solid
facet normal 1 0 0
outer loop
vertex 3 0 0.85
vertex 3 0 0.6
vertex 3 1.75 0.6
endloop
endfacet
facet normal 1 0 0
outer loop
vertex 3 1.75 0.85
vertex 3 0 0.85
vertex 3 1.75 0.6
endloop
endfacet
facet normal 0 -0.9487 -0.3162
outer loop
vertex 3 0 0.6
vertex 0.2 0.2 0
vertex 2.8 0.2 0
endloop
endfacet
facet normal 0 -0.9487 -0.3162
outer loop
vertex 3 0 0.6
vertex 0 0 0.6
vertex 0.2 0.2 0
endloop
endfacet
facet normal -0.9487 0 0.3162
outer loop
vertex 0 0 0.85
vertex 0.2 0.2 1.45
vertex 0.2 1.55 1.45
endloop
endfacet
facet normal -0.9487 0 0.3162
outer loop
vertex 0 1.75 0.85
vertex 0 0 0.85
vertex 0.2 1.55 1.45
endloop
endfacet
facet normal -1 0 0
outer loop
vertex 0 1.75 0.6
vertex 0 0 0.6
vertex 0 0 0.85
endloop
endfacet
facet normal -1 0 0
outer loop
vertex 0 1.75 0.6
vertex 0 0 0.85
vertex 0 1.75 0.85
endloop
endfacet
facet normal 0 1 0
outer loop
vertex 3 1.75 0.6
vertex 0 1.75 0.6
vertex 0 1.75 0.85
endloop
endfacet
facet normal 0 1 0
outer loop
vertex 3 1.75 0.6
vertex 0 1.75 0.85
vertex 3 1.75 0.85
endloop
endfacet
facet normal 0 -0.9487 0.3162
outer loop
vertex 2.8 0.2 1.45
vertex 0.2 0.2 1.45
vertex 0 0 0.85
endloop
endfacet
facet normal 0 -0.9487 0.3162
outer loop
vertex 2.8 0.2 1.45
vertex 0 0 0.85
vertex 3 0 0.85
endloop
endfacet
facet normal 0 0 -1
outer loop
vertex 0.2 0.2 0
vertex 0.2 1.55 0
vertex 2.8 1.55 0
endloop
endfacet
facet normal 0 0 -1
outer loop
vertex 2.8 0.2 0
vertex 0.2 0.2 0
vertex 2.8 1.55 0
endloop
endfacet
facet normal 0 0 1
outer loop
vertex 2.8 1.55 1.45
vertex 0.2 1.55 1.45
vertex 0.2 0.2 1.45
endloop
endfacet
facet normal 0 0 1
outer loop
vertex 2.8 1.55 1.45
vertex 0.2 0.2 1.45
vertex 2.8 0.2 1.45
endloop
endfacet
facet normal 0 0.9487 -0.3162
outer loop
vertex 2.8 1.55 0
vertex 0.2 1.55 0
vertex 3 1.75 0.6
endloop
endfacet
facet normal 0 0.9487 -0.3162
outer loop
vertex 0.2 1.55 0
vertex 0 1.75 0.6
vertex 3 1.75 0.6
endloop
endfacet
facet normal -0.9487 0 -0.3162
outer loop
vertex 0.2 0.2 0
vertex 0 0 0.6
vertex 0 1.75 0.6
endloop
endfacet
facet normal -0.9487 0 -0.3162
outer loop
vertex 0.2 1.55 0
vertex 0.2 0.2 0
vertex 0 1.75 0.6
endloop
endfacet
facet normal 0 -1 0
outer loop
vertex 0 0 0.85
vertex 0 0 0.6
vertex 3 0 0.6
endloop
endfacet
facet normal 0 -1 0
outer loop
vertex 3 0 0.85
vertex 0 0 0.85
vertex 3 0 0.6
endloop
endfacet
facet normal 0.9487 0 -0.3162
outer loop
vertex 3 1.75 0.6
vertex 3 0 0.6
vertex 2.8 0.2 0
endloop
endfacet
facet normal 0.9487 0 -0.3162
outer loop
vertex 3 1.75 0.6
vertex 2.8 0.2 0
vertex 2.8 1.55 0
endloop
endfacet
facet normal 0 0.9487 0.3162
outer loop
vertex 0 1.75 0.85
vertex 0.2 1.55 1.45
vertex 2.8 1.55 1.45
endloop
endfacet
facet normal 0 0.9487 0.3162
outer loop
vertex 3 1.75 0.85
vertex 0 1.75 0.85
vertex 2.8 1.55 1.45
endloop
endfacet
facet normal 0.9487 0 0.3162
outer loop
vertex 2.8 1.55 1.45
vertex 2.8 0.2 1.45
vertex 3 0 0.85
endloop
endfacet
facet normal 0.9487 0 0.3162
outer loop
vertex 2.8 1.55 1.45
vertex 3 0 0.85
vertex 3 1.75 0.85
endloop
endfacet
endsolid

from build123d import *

# Parameters (mm, degrees)
ESQUISSE1_W        = 3
ESQUISSE1_H        = 1.75
BOSS_EXTRU_1_DEPTH = 1.45
CHANFREIN1_SIZE    = 0.6
CHANFREIN1_SIZE2   = 0.2
CHANFREIN2_SIZE    = 0.2
CHANFREIN2_SIZE2   = 0.6
CHANFREIN3_SIZE    = 0.6
CHANFREIN3_SIZE2   = 0.2
CHANFREIN4_SIZE    = 0.2
CHANFREIN4_SIZE2   = 0.6
CHANFREIN5_SIZE    = 0.6
CHANFREIN5_SIZE2   = 0.2
CHANFREIN6_SIZE    = 0.2
CHANFREIN6_SIZE2   = 0.6
CHANFREIN7_SIZE    = 0.6
CHANFREIN7_SIZE2   = 0.2
CHANFREIN8_SIZE    = 0.2
CHANFREIN8_SIZE2   = 0.6


with BuildPart() as part:
    # Esquisse1 → Boss.-Extru.1 (new body)
    with BuildSketch(Plane.XY):
        with Locations((1.5, 0.875)):
            Rectangle(ESQUISSE1_W, ESQUISSE1_H)
    extrude(amount=BOSS_EXTRU_1_DEPTH)

    # Chanfrein1
    chanfrein1_edges = [part.edges().sort_by_distance(p)[0] for p in [
        (1.5, 0, 1.45),
    ]]
    chanfrein1_side = [part.faces().sort_by_distance(p)[0] for p in [
        (1.5, 0, 0.725),
    ]]
    chamfer(chanfrein1_edges, length=CHANFREIN1_SIZE, length2=CHANFREIN1_SIZE2, reference=chanfrein1_side[0])

    # Chanfrein2
    chanfrein2_edges = [part.edges().sort_by_distance(p)[0] for p in [
        (1.5, 0, 0),
    ]]
    chanfrein2_side = [part.faces().sort_by_distance(p)[0] for p in [
        (1.5, 0.875, 0),
    ]]
    chamfer(chanfrein2_edges, length=CHANFREIN2_SIZE, length2=CHANFREIN2_SIZE2, reference=chanfrein2_side[0])

    # Chanfrein3
    chanfrein3_edges = [part.edges().sort_by_distance(p)[0] for p in [
        (1.5, 1.75, 1.45),
    ]]
    chanfrein3_side = [part.faces().sort_by_distance(p)[0] for p in [
        (1.5, 1.75, 0.725),
    ]]
    chamfer(chanfrein3_edges, length=CHANFREIN3_SIZE, length2=CHANFREIN3_SIZE2, reference=chanfrein3_side[0])

    # Chanfrein4
    chanfrein4_edges = [part.edges().sort_by_distance(p)[0] for p in [
        (1.5, 1.75, 0),
    ]]
    chanfrein4_side = [part.faces().sort_by_distance(p)[0] for p in [
        (1.5, 0.975, 0),
    ]]
    chamfer(chanfrein4_edges, length=CHANFREIN4_SIZE, length2=CHANFREIN4_SIZE2, reference=chanfrein4_side[0])

    # Chanfrein5
    chanfrein5_edges = [part.edges().sort_by_distance(p)[0] for p in [
        (0, 0.875, 1.45),
    ]]
    chanfrein5_side = [part.faces().sort_by_distance(p)[0] for p in [
        (0, 0.875, 0.725),
    ]]
    chamfer(chanfrein5_edges, length=CHANFREIN5_SIZE, length2=CHANFREIN5_SIZE2, reference=chanfrein5_side[0])

    # Chanfrein6
    chanfrein6_edges = [part.edges().sort_by_distance(p)[0] for p in [
        (0, 0.875, 0),
    ]]
    chanfrein6_side = [part.faces().sort_by_distance(p)[0] for p in [
        (1.5, 0.875, 0),
    ]]
    chamfer(chanfrein6_edges, length=CHANFREIN6_SIZE, length2=CHANFREIN6_SIZE2, reference=chanfrein6_side[0])

    # Chanfrein7
    chanfrein7_edges = [part.edges().sort_by_distance(p)[0] for p in [
        (3, 0.875, 1.45),
    ]]
    chanfrein7_side = [part.faces().sort_by_distance(p)[0] for p in [
        (3, 0.875, 0.725),
    ]]
    chamfer(chanfrein7_edges, length=CHANFREIN7_SIZE, length2=CHANFREIN7_SIZE2, reference=chanfrein7_side[0])

    # Chanfrein8
    chanfrein8_edges = [part.edges().sort_by_distance(p)[0] for p in [
        (3, 0.875, 0),
    ]]
    chanfrein8_side = [part.faces().sort_by_distance(p)[0] for p in [
        (1.6, 0.875, 0),
    ]]
    chamfer(chanfrein8_edges, length=CHANFREIN8_SIZE, length2=CHANFREIN8_SIZE2, reference=chanfrein8_side[0])


solid = part.part
